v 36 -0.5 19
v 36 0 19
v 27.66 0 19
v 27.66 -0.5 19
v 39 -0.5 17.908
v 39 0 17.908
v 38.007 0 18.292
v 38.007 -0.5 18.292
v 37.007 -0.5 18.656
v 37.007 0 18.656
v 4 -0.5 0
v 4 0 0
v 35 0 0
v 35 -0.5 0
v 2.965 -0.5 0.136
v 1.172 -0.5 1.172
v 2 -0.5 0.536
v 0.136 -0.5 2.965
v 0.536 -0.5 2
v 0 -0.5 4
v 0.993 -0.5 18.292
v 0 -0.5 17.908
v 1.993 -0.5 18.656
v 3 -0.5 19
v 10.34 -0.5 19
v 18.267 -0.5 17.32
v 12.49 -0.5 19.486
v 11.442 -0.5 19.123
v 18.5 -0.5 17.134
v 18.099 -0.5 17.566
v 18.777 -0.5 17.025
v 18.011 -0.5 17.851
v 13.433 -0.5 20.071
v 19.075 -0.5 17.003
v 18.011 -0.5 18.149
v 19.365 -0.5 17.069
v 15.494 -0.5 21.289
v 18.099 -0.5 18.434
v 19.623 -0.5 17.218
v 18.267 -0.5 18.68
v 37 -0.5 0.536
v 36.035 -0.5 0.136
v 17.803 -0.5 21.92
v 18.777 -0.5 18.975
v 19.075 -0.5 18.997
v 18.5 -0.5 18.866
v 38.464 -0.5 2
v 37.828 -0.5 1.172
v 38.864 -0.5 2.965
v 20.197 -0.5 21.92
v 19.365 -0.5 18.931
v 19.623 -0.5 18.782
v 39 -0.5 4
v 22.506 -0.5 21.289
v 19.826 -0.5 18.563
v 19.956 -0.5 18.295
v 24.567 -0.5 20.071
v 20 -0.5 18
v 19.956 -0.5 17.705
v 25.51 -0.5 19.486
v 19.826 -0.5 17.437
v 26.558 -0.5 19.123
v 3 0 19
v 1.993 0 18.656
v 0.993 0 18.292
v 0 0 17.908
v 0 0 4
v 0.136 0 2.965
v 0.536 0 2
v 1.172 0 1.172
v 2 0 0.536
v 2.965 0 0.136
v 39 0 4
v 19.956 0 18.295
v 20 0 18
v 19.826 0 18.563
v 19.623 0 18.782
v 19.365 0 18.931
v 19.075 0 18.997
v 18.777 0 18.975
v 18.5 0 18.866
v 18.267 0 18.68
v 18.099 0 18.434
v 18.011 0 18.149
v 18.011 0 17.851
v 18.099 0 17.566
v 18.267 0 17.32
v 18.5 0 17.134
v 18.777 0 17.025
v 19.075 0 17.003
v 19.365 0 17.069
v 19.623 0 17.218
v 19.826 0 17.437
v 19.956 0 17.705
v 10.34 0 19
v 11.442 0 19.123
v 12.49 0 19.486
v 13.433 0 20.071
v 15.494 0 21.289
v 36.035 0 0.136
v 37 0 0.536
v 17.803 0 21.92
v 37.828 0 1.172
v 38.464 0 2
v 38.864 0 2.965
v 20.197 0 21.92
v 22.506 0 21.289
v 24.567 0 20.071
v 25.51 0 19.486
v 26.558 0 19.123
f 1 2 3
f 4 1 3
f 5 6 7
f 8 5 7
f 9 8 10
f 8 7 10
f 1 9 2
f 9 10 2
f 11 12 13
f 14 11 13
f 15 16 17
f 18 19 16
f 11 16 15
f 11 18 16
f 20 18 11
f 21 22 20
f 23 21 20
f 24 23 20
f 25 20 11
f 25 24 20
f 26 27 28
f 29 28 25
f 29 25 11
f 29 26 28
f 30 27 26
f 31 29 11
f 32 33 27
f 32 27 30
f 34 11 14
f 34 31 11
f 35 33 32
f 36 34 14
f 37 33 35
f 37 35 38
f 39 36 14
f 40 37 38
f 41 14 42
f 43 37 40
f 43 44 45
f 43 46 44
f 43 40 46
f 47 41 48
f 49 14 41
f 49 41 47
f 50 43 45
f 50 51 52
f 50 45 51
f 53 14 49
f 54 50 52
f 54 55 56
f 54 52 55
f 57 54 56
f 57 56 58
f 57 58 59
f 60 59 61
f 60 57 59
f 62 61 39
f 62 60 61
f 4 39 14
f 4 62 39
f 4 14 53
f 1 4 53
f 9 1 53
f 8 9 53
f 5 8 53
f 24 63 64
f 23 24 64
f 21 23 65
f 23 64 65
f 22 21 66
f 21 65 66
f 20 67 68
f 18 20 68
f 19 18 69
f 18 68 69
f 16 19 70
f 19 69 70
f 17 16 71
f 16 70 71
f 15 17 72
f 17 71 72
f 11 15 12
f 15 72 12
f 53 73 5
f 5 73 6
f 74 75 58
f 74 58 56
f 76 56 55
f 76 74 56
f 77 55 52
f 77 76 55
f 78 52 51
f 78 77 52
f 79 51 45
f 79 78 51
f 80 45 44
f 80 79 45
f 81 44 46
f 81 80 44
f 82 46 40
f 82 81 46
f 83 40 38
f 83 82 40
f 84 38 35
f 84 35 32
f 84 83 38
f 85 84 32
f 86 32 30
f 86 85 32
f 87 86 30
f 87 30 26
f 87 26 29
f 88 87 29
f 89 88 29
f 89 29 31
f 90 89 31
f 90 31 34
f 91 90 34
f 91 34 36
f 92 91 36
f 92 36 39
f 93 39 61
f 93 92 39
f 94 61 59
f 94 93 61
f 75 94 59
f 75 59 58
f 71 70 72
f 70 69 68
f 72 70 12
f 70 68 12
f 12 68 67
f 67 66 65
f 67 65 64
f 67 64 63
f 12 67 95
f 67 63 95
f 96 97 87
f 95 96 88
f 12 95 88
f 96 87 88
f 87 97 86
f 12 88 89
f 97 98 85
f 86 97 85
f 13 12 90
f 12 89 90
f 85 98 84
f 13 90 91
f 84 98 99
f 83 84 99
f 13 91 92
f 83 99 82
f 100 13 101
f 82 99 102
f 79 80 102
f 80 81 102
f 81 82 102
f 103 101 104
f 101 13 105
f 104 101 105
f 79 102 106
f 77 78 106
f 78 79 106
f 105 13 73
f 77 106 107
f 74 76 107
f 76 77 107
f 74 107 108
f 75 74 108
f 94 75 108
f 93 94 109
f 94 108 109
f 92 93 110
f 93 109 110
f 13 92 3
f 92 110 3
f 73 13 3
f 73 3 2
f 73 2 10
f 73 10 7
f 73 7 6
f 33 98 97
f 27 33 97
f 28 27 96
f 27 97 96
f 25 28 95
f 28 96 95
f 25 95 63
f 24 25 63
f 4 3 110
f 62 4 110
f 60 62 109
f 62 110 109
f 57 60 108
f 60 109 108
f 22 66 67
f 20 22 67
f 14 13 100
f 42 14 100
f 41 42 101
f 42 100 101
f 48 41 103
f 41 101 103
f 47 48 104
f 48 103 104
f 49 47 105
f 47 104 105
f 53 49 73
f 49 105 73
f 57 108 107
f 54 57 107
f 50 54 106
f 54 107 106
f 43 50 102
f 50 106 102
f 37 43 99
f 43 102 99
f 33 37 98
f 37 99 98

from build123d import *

# Parameters (mm, degrees)
F0_R     = 1
F1_DEPTH = 0.5


with BuildPart() as f1:
    # F0 (on Front) → F1 (new body)
    with BuildSketch(Plane.XZ):
        with BuildLine():
            ThreePointArc((0, 4), (1.171573, 1.171573), (4, 0))
            Line((4, 0), (35, 0))
            ThreePointArc((35, 0), (37.828427, 1.171573), (39, 4))
            Line((39, 4), (39, 17.908077))
            ThreePointArc((39, 17.908077), (37.508278, 18.476782), (36, 19))
            Line((36, 19), (27.660254, 19))
            ThreePointArc((27.660254, 19), (26.02362, 19.275444), (24.567306, 20.071429))
            ThreePointArc((24.567306, 20.071429), (19, 22), (13.432694, 20.071429))
            ThreePointArc((13.432694, 20.071429), (11.97638, 19.275444), (10.339746, 19))
            Line((10.339746, 19), (3, 19))
            ThreePointArc((3, 19), (1.491722, 18.476782), (0, 17.908077))
            Line((0, 17.908077), (0, 4))
        make_face()
        with Locations((19, 18)):
            Circle(F0_R, mode=Mode.SUBTRACT)
    extrude(amount=F1_DEPTH)


solid = f1.part
